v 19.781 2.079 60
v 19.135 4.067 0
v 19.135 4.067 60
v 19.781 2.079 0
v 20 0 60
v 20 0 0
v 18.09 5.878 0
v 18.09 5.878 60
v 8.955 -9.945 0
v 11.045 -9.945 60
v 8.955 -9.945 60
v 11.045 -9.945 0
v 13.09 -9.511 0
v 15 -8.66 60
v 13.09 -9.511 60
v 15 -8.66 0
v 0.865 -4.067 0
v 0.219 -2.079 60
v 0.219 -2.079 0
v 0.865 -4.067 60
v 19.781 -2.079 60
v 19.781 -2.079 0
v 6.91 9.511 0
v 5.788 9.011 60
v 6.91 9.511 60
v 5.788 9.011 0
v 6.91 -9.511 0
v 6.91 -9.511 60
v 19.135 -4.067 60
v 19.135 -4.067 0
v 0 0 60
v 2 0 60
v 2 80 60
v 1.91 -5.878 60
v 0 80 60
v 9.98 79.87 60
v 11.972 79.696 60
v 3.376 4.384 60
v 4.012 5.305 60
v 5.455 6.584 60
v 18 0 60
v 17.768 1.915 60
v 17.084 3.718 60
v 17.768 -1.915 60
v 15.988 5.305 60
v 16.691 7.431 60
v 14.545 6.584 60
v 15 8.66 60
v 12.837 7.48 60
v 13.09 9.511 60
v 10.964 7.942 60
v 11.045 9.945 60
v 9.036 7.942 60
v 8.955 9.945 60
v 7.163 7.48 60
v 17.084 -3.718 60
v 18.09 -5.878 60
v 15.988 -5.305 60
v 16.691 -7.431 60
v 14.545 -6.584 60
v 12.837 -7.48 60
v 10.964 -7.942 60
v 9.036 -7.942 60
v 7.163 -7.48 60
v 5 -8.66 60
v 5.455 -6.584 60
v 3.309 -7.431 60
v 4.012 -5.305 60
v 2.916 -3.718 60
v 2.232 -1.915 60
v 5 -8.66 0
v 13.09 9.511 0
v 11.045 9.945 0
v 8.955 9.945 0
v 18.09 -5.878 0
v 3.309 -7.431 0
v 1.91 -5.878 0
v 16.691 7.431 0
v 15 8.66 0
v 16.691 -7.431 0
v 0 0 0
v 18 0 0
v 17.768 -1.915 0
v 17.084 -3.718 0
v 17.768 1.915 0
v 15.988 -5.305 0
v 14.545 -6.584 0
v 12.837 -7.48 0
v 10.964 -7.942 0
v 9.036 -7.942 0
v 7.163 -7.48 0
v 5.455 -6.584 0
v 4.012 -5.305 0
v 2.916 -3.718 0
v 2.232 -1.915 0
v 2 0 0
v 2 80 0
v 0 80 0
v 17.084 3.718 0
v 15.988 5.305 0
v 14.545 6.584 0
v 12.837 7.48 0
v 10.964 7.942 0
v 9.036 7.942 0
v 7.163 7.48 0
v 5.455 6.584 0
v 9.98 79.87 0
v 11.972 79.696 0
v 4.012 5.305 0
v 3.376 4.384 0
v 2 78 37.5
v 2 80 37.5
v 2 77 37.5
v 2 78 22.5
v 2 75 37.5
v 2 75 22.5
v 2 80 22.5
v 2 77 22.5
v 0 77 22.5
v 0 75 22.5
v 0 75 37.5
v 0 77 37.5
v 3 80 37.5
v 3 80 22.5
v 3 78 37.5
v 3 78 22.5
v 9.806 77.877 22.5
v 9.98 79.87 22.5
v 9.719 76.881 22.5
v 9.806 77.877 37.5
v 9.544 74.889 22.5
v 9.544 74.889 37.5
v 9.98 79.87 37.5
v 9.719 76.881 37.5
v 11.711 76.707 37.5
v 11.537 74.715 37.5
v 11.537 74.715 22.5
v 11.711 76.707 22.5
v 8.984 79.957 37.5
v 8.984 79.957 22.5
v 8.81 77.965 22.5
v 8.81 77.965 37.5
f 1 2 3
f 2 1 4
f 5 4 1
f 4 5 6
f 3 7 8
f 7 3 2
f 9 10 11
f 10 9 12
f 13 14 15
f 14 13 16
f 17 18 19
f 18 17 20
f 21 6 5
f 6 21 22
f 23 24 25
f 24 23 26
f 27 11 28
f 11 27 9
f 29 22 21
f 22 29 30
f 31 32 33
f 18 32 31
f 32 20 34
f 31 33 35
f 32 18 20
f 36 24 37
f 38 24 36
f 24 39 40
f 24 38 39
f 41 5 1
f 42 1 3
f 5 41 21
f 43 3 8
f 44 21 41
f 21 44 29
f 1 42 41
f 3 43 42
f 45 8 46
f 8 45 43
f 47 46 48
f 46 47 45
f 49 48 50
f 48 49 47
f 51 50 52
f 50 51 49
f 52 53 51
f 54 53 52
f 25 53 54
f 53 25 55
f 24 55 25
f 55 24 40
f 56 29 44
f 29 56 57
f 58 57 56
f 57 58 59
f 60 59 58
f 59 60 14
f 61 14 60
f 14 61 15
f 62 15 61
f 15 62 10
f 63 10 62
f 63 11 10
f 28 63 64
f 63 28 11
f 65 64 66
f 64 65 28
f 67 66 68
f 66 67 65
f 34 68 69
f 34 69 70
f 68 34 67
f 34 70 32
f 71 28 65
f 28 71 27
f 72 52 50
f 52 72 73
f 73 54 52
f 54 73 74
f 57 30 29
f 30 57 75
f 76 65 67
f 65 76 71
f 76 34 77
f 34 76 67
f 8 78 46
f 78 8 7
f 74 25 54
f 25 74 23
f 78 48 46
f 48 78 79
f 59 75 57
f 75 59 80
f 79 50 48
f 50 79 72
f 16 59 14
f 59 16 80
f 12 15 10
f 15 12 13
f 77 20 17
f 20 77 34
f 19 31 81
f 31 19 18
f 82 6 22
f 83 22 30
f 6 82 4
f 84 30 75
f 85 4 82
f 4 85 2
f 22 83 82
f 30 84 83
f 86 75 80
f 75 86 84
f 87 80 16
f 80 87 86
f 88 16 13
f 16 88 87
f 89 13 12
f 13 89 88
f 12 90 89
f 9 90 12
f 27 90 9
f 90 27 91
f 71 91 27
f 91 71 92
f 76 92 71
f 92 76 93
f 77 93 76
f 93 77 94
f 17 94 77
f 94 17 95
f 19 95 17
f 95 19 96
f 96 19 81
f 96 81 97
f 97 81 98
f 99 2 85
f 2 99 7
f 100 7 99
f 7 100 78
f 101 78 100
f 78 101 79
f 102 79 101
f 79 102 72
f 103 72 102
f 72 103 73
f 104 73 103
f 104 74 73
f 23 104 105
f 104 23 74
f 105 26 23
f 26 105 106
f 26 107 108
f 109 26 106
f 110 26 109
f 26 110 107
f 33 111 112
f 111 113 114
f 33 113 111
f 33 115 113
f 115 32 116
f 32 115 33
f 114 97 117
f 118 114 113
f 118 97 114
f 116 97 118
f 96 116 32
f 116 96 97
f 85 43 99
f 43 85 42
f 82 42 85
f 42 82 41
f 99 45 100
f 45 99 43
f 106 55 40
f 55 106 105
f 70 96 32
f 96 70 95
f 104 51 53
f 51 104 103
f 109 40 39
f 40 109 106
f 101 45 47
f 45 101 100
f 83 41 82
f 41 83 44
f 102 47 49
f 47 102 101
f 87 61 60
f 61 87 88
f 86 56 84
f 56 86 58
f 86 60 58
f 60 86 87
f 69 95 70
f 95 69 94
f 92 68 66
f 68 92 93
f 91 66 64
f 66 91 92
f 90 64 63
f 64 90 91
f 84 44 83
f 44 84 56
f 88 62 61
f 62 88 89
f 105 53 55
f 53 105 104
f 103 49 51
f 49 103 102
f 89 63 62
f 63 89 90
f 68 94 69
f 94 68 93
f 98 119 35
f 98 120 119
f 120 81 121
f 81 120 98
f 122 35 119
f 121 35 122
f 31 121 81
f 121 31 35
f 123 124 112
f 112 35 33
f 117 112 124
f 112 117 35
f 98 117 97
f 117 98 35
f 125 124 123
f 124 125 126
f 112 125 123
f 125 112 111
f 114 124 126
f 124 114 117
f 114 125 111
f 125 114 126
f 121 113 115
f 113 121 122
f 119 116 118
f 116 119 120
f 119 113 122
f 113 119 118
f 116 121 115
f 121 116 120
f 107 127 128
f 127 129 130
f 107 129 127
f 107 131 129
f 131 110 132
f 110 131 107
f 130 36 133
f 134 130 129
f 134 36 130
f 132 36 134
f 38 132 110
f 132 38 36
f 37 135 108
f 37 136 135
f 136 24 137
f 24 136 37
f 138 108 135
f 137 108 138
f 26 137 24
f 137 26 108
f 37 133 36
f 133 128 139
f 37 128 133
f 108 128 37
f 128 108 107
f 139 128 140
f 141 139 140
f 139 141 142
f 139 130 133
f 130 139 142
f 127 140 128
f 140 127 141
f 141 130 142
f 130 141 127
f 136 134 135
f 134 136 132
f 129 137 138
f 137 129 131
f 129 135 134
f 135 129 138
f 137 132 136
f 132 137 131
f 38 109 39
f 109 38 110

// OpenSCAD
//


xx = 60;
yy = 80;
zz = 2;


angle = 5;
rad = 10;
thick = 2;

dist = 5;

cut_l = 15;

pedal();
module pedal() {
    
    difference() {
        union() {
            
            
            
            translate([rad,0,0]) cylinder(d=rad*2, h=xx);
        }
        
        translate([zz,0,0]) cube([dist-zz,yy,xx]);
        translate([rad,0,0]) cylinder(d=rad*2-thick*2, h=xx);
    }
    plate();
    difference() {
        translate([dist,0,0]) rotate([0,0,-angle]) mirror([1,0,0]) plate();
        translate([rad,0,0]) cylinder(d=rad*2-thick*2, h=xx);
    }
}

module plate() {
    difference() {
        union() {
            cube([zz,yy,xx]);
            translate([0,yy-2,xx/2-cut_l/2]) cube([zz+1,2,cut_l]);
            
        }
        translate([0,yy-2-3,xx/2-cut_l/2]) cube([zz+1,2,cut_l]);
    }
    
}
